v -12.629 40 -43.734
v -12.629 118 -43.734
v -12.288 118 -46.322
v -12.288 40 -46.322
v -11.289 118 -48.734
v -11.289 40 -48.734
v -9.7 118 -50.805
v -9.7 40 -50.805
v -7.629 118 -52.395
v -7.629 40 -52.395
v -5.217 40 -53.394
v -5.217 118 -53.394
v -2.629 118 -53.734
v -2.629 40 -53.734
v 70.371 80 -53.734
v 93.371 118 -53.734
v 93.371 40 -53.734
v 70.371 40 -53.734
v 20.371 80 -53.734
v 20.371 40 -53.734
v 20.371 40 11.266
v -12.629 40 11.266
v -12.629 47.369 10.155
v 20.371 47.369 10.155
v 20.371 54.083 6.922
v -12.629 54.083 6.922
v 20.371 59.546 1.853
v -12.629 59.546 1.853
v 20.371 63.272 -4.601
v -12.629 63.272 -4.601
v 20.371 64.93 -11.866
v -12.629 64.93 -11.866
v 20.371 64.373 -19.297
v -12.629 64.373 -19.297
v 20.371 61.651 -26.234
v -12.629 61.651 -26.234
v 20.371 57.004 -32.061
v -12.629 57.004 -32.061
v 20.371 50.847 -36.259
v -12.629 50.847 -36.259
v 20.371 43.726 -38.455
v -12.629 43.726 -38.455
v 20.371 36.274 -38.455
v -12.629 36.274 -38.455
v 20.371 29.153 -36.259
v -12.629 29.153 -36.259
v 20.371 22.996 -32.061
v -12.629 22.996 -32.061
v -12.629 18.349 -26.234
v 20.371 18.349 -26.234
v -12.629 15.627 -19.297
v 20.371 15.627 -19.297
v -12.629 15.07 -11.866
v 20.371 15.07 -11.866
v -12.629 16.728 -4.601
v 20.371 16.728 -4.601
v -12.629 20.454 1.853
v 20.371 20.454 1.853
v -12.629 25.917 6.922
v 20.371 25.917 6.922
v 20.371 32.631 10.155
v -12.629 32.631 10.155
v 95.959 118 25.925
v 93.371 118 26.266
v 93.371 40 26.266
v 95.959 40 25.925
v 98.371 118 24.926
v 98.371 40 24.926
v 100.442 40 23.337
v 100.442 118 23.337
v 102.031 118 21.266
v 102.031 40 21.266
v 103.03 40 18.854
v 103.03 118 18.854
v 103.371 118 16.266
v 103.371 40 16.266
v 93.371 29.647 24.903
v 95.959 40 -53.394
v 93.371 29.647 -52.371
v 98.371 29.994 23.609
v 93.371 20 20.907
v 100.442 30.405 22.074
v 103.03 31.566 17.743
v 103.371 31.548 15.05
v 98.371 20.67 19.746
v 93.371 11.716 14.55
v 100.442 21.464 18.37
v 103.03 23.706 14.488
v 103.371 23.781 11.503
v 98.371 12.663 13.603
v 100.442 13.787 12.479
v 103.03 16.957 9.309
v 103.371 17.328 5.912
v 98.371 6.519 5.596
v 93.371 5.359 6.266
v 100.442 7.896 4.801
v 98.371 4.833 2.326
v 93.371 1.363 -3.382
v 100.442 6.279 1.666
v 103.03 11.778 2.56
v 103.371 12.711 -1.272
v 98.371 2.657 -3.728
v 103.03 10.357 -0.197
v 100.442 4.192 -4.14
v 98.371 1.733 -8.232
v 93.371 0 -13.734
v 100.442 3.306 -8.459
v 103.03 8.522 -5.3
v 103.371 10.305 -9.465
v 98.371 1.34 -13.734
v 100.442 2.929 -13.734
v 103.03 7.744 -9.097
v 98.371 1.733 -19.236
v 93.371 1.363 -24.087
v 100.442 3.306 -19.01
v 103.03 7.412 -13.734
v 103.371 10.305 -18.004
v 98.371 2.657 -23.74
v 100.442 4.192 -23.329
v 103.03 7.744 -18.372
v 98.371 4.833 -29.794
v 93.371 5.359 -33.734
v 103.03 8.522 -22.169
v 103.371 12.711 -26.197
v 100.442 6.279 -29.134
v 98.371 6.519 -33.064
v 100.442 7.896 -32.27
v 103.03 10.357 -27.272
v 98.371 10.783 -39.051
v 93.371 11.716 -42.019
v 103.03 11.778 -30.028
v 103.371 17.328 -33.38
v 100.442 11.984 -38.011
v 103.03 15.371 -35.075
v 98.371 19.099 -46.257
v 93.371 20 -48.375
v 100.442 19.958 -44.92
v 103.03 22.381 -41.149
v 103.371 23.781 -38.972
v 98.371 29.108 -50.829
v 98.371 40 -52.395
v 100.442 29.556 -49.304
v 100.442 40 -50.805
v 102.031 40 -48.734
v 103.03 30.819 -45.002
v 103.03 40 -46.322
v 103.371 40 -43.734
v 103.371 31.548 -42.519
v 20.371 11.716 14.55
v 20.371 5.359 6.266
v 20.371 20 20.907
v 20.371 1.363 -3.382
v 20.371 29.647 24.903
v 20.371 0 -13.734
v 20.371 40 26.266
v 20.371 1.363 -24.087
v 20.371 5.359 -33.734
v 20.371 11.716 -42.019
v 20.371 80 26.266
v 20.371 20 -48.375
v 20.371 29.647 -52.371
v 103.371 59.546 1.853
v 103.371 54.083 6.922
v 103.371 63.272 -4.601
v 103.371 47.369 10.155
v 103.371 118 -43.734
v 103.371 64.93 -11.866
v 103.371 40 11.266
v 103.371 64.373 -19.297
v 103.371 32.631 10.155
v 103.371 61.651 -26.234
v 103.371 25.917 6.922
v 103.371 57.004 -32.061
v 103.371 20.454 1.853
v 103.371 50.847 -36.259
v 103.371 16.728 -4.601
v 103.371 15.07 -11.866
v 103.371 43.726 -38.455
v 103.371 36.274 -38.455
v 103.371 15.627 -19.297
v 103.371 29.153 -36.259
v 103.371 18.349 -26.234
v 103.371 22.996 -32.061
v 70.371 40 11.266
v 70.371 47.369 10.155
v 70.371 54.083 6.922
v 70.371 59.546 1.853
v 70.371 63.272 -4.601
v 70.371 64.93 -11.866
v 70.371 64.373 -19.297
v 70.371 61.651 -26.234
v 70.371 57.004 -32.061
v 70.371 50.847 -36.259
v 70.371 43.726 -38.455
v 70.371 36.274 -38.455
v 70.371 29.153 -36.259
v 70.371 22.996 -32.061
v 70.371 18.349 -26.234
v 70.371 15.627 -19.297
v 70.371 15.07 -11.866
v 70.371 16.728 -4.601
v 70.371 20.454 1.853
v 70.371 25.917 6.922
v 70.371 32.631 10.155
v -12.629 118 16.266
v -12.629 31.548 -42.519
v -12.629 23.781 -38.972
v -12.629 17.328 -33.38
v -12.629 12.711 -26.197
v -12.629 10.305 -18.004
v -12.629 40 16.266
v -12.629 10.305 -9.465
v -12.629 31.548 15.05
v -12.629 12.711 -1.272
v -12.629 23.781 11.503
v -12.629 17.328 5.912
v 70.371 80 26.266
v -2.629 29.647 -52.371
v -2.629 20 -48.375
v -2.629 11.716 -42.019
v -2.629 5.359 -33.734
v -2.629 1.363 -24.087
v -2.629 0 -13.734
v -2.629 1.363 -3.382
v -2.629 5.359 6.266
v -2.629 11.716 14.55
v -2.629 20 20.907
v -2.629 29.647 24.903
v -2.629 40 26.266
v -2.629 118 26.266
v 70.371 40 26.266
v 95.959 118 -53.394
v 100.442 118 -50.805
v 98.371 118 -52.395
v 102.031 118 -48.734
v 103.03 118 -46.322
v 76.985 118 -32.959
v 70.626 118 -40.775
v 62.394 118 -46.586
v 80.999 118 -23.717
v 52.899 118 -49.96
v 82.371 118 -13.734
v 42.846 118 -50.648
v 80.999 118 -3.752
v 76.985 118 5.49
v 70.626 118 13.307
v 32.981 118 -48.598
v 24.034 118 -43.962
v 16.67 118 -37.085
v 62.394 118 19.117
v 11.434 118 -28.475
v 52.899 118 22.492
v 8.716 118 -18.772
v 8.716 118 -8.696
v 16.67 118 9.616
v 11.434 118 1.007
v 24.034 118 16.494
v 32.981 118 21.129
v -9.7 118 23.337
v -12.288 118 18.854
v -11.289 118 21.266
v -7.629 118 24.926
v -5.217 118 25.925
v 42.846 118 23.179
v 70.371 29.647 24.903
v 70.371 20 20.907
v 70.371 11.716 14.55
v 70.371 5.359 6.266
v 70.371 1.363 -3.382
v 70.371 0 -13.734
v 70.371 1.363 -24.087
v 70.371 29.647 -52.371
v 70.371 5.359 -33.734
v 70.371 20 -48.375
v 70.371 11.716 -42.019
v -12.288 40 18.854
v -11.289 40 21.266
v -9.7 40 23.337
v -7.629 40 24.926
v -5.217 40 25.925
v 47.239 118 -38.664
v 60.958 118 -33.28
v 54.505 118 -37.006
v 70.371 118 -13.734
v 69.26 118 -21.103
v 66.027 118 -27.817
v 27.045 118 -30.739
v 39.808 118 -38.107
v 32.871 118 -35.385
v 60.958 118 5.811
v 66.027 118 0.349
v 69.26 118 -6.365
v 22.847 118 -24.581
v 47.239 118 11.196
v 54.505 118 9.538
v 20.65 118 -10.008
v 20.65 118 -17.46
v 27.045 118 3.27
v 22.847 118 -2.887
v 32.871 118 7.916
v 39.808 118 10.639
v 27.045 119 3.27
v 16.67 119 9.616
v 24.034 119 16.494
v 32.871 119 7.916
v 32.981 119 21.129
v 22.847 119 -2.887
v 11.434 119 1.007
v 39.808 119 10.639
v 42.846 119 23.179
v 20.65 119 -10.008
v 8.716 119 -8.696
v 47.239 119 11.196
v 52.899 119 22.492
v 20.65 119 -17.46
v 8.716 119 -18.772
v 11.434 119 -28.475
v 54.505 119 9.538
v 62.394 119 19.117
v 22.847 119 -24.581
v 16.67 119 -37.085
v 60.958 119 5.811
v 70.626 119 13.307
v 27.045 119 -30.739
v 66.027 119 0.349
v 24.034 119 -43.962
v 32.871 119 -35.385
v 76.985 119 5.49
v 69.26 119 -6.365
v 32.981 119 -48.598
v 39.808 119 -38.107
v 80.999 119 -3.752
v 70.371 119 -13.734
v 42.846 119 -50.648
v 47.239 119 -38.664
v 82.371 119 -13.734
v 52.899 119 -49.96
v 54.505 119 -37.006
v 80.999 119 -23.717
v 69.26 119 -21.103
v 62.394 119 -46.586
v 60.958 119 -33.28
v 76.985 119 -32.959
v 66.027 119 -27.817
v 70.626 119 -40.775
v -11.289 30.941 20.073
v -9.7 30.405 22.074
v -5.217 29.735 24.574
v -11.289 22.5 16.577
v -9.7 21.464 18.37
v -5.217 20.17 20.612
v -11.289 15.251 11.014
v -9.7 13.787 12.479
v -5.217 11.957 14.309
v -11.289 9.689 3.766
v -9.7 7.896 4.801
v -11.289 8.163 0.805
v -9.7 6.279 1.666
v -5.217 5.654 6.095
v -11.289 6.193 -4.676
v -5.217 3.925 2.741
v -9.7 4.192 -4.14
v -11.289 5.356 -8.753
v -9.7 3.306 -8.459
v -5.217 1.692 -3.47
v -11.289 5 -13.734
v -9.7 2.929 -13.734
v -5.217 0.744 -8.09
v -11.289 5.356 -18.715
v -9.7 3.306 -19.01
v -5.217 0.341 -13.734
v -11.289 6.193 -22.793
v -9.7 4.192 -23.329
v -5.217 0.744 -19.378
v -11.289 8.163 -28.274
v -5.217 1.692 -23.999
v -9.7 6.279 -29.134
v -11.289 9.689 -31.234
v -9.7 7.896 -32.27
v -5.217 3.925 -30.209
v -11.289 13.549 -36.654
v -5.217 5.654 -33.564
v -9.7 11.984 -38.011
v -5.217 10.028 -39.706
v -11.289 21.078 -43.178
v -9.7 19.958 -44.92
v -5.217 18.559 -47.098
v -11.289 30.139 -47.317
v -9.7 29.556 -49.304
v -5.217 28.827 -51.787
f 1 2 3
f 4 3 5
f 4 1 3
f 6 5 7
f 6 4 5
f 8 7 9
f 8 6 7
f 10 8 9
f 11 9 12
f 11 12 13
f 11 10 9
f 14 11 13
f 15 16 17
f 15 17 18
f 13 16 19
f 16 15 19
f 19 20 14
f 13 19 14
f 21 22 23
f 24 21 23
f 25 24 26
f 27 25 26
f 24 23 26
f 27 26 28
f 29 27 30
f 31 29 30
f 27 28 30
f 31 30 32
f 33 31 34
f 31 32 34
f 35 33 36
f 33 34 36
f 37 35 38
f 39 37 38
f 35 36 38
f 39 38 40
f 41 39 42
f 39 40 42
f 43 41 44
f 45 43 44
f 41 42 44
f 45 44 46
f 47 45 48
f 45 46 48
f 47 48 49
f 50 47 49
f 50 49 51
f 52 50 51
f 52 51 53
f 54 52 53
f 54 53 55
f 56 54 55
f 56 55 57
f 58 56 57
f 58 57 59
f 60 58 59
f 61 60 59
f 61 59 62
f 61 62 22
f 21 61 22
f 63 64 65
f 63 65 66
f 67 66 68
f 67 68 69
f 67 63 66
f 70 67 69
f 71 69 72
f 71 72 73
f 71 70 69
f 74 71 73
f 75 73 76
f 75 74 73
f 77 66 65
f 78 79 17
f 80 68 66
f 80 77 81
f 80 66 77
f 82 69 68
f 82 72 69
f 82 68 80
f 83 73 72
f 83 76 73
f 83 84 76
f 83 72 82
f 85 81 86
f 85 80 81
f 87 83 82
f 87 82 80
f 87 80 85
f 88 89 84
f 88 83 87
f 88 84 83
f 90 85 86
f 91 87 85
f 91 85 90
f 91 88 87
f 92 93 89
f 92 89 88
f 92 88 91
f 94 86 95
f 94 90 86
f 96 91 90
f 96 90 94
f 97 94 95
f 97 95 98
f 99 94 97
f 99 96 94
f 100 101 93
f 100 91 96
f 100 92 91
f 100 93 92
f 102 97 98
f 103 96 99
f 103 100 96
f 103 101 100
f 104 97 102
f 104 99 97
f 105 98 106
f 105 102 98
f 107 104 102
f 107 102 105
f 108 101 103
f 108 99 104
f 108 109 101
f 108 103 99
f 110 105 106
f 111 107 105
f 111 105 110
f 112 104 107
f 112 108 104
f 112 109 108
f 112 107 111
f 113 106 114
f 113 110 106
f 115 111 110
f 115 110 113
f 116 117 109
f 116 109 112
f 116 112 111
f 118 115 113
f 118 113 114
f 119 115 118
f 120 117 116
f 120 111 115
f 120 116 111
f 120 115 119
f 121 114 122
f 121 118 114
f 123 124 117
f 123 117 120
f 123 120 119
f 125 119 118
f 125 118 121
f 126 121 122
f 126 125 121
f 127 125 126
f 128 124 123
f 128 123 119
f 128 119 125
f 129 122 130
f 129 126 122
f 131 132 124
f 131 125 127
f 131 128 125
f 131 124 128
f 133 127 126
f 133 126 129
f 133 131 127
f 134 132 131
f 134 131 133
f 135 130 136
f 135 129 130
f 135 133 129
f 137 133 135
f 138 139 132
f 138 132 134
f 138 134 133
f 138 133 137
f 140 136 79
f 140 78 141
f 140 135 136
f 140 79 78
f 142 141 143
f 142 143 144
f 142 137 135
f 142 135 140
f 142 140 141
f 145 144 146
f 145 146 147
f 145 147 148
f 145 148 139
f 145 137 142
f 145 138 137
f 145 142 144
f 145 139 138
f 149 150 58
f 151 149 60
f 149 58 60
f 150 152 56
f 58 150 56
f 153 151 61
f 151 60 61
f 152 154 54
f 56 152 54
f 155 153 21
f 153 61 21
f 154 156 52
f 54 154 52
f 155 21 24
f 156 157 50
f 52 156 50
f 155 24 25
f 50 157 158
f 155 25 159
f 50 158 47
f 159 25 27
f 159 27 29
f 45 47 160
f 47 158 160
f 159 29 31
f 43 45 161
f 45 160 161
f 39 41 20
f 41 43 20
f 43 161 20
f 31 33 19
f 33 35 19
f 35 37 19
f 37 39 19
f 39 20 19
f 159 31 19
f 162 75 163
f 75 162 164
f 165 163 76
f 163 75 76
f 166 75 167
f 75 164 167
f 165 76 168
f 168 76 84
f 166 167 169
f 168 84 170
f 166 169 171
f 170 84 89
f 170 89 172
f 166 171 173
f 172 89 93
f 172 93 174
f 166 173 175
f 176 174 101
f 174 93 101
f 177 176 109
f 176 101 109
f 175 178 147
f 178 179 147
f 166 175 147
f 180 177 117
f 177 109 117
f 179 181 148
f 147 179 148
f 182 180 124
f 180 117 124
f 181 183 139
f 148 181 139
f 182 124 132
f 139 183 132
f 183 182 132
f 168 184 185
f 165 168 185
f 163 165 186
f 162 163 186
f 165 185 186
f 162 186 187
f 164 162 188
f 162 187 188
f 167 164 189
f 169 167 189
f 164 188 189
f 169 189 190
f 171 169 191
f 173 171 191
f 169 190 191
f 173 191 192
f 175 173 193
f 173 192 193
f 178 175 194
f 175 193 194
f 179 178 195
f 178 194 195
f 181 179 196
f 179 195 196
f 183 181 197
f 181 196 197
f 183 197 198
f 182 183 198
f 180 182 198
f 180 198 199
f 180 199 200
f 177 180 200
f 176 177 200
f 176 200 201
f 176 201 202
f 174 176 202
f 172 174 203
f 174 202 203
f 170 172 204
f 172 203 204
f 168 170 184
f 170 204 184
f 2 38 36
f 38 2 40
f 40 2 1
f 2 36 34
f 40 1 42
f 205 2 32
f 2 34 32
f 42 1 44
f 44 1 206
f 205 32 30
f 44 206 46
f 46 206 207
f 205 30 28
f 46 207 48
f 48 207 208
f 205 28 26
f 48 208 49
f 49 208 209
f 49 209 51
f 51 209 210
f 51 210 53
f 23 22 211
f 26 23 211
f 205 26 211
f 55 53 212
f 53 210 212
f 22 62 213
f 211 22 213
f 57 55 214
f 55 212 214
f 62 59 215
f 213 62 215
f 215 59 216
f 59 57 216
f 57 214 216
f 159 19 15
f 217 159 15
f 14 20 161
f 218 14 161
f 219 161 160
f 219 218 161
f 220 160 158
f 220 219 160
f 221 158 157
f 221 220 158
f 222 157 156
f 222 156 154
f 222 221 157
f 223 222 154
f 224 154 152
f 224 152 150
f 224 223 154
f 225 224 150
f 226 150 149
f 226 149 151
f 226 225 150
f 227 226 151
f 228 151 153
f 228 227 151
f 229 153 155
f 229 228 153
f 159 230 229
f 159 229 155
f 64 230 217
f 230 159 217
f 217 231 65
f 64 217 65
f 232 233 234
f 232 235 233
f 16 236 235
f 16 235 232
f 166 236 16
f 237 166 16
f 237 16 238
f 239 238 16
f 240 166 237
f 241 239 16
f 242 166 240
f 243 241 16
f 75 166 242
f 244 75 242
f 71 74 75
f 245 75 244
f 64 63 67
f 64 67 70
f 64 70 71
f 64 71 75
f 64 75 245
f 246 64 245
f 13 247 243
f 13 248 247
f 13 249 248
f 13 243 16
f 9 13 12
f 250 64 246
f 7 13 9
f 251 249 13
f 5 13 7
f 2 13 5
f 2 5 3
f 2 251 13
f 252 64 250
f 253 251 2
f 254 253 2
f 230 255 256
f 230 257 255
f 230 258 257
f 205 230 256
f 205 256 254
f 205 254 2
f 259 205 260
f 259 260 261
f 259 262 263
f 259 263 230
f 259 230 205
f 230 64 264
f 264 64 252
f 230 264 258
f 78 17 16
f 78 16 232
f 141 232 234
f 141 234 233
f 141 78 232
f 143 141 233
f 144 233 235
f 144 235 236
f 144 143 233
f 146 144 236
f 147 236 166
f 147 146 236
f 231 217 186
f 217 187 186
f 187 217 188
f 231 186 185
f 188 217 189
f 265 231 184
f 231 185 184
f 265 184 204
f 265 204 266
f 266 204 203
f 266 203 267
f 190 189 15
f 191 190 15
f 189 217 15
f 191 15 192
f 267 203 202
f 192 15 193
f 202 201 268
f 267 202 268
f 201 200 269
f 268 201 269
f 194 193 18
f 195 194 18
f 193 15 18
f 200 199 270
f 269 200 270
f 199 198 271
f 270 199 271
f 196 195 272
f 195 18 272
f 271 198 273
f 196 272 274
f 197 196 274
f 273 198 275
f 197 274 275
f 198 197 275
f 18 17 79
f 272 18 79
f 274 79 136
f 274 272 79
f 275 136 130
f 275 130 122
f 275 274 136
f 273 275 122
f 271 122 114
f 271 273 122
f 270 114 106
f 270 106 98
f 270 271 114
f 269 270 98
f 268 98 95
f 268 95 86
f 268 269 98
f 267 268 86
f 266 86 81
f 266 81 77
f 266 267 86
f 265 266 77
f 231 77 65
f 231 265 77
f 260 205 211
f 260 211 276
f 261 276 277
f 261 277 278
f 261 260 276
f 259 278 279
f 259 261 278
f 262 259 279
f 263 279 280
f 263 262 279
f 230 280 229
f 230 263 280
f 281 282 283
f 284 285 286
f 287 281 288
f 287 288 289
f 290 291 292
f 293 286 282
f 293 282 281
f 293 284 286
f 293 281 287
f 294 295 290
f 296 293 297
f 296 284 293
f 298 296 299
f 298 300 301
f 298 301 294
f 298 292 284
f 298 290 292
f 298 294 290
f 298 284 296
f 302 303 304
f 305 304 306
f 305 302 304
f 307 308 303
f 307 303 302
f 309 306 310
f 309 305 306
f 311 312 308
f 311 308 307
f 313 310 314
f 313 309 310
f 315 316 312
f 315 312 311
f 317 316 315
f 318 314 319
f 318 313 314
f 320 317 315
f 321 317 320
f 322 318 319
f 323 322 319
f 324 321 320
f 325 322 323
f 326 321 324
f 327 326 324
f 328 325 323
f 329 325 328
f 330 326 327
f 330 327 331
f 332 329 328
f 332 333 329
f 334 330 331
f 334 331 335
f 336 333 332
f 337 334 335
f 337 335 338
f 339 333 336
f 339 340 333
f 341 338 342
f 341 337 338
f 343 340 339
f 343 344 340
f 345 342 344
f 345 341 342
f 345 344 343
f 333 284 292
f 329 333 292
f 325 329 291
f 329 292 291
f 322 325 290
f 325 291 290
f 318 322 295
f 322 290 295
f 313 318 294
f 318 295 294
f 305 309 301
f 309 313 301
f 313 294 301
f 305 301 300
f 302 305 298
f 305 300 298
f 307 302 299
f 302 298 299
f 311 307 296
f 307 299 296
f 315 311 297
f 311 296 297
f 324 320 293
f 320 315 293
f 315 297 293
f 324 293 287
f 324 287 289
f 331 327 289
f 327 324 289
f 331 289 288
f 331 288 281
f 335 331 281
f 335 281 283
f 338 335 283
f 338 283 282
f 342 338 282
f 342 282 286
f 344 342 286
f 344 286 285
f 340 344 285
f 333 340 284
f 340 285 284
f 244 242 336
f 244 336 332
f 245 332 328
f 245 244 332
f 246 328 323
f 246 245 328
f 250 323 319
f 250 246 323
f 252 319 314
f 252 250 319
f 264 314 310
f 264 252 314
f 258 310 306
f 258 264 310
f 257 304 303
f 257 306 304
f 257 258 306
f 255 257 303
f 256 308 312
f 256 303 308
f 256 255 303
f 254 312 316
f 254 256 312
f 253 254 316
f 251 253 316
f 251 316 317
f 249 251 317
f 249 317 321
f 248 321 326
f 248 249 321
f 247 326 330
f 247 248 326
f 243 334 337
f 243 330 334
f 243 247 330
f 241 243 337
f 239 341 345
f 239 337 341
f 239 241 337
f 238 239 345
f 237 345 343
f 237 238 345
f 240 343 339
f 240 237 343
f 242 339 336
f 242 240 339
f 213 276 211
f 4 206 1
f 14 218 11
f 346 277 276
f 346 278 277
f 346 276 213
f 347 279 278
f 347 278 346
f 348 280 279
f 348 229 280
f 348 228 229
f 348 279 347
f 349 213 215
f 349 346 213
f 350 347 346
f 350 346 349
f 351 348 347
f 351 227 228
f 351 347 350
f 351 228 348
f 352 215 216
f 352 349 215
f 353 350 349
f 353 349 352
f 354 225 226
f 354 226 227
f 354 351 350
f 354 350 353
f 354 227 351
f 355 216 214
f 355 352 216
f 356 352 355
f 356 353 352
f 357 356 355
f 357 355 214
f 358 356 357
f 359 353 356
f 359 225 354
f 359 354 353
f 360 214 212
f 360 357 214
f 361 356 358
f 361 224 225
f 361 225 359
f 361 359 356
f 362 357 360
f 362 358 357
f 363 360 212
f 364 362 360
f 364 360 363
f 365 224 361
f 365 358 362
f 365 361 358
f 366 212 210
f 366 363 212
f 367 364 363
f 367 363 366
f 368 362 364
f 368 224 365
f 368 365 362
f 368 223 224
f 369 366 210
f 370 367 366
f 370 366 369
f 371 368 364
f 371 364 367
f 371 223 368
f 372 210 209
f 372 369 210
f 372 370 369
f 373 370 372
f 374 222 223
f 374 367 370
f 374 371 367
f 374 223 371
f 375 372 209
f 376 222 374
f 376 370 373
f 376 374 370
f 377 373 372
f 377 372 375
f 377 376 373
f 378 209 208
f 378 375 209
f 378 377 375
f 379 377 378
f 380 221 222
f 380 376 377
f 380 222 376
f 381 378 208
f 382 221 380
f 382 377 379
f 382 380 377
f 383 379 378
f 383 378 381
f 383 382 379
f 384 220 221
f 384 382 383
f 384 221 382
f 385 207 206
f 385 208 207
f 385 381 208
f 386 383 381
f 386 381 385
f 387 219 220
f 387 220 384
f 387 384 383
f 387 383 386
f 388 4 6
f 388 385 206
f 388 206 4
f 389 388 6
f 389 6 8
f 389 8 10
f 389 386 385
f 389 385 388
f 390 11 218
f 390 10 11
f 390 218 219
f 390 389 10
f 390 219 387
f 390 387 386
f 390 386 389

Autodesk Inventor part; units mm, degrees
ref_plane "YZ Plane" through (0, 0, 0) normal (1, 0, 0) x (0, 1, 0)
ref_plane "XZ Plane" through (0, 0, 0) normal (0, 1, 0) x (-1, 0, 0)
ref_plane "XY Plane" through (0, 0, 0) normal (0, 0, 1) x (1, 0, 0)
sketch "Sketch1" plane through (0, 0, 0) normal (0, 1, 0) x (-1, 0, 0)
  line L0 (12.6289, 26.2657) -> (-103.3711, 26.2657)
  line L1 (-103.3711, 26.2657) -> (-103.3711, -53.7343)
  line L2 (-103.3711, -53.7343) -> (12.6289, -53.7343)
  line L3 (12.6289, -53.7343) -> (12.6289, 26.2657)
  point P0 (0, 0)
  dimension "d0" = 116
  dimension "d1" = 80
extrude "Extrusion1" add sketch "Sketch1" along normal blind 118
sketch "Sketch2" plane through (0, 118, 0) normal (0, 1, 0) x (1, 0, 0)
  circle A0 centre (45.3711, 13.7343) radius 37
  circle A1 centre (45.3711, 13.7343) radius 25
  point P0 (0, 0)
  point P1 (-12.6289, -26.2657)
  dimension "d5" = 74
  dimension "d6" = 50
extrude "Extrusion2" add sketch "Sketch2" along normal blind 1
sketch "Sketch3" plane through (103.3711, 0, -53.7343) normal (0, 0, -1) x (-1, 0, 0)
  line L0 (0, 0) -> (116, 0) projected
  line L1 (0, 0) -> (33, 0)
  line L2 (33, 0) -> (83, 0)
  line L3 (83, 0) -> (83, 80)
  line L4 (83, 80) -> (33, 80)
  line L5 (33, 80) -> (33, 0)
  point P0 (103.3711, 0)
  dimension "d9" = 33
  dimension "d10" = 50
  dimension "d11" = 80
extrude "Extrusion3" cut sketch "Sketch3" against normal blind 200
sketch "Sketch4" plane through (-12.6289, 0, -53.7343) normal (-1, 0, 0) x (0, 0, 1)
  circle A0 centre (40, 40) radius 40
  line L0 (0, 0) -> (80, 0) projected
  line L1 (0, 0) -> (0, 118) projected
  circle A1 centre (40, 40) radius 25
  line L2 (0, 0) -> (0, 118) projected
  line L3 (0, 118) -> (80, 118)
  line L4 (80, 118) -> (80, 0)
  line L5 (80, 0) -> (0, 0)
  line L6 (0, 0) -> (0, 118)
  point P0 (53.7343, 0)
  point P1 (0, 40)
  point P2 (40, 0)
  point P3 (80, 40)
  dimension "d14" = 80
  dimension "d15" = 50
extrude "Extrusion4" cut sketch "Sketch4" against normal blind 200 contours A1
extrude "Extrusion5" cut sketch "Sketch4" against normal blind 200 contours A0 L0 L1
extrude "Extrusion6" cut sketch "Sketch4" against normal blind 200 contours L4 L0 A0
fillet "Fillet1" radius 10 6 edges at (-12.6289, 0, -13.7343) (-12.6289, 79, -53.7343) (-12.6289, 79, 26.2657) (103.3711, 0, -13.7343) (103.3711, 79, -53.7343) (103.3711, 79, 26.2657)
